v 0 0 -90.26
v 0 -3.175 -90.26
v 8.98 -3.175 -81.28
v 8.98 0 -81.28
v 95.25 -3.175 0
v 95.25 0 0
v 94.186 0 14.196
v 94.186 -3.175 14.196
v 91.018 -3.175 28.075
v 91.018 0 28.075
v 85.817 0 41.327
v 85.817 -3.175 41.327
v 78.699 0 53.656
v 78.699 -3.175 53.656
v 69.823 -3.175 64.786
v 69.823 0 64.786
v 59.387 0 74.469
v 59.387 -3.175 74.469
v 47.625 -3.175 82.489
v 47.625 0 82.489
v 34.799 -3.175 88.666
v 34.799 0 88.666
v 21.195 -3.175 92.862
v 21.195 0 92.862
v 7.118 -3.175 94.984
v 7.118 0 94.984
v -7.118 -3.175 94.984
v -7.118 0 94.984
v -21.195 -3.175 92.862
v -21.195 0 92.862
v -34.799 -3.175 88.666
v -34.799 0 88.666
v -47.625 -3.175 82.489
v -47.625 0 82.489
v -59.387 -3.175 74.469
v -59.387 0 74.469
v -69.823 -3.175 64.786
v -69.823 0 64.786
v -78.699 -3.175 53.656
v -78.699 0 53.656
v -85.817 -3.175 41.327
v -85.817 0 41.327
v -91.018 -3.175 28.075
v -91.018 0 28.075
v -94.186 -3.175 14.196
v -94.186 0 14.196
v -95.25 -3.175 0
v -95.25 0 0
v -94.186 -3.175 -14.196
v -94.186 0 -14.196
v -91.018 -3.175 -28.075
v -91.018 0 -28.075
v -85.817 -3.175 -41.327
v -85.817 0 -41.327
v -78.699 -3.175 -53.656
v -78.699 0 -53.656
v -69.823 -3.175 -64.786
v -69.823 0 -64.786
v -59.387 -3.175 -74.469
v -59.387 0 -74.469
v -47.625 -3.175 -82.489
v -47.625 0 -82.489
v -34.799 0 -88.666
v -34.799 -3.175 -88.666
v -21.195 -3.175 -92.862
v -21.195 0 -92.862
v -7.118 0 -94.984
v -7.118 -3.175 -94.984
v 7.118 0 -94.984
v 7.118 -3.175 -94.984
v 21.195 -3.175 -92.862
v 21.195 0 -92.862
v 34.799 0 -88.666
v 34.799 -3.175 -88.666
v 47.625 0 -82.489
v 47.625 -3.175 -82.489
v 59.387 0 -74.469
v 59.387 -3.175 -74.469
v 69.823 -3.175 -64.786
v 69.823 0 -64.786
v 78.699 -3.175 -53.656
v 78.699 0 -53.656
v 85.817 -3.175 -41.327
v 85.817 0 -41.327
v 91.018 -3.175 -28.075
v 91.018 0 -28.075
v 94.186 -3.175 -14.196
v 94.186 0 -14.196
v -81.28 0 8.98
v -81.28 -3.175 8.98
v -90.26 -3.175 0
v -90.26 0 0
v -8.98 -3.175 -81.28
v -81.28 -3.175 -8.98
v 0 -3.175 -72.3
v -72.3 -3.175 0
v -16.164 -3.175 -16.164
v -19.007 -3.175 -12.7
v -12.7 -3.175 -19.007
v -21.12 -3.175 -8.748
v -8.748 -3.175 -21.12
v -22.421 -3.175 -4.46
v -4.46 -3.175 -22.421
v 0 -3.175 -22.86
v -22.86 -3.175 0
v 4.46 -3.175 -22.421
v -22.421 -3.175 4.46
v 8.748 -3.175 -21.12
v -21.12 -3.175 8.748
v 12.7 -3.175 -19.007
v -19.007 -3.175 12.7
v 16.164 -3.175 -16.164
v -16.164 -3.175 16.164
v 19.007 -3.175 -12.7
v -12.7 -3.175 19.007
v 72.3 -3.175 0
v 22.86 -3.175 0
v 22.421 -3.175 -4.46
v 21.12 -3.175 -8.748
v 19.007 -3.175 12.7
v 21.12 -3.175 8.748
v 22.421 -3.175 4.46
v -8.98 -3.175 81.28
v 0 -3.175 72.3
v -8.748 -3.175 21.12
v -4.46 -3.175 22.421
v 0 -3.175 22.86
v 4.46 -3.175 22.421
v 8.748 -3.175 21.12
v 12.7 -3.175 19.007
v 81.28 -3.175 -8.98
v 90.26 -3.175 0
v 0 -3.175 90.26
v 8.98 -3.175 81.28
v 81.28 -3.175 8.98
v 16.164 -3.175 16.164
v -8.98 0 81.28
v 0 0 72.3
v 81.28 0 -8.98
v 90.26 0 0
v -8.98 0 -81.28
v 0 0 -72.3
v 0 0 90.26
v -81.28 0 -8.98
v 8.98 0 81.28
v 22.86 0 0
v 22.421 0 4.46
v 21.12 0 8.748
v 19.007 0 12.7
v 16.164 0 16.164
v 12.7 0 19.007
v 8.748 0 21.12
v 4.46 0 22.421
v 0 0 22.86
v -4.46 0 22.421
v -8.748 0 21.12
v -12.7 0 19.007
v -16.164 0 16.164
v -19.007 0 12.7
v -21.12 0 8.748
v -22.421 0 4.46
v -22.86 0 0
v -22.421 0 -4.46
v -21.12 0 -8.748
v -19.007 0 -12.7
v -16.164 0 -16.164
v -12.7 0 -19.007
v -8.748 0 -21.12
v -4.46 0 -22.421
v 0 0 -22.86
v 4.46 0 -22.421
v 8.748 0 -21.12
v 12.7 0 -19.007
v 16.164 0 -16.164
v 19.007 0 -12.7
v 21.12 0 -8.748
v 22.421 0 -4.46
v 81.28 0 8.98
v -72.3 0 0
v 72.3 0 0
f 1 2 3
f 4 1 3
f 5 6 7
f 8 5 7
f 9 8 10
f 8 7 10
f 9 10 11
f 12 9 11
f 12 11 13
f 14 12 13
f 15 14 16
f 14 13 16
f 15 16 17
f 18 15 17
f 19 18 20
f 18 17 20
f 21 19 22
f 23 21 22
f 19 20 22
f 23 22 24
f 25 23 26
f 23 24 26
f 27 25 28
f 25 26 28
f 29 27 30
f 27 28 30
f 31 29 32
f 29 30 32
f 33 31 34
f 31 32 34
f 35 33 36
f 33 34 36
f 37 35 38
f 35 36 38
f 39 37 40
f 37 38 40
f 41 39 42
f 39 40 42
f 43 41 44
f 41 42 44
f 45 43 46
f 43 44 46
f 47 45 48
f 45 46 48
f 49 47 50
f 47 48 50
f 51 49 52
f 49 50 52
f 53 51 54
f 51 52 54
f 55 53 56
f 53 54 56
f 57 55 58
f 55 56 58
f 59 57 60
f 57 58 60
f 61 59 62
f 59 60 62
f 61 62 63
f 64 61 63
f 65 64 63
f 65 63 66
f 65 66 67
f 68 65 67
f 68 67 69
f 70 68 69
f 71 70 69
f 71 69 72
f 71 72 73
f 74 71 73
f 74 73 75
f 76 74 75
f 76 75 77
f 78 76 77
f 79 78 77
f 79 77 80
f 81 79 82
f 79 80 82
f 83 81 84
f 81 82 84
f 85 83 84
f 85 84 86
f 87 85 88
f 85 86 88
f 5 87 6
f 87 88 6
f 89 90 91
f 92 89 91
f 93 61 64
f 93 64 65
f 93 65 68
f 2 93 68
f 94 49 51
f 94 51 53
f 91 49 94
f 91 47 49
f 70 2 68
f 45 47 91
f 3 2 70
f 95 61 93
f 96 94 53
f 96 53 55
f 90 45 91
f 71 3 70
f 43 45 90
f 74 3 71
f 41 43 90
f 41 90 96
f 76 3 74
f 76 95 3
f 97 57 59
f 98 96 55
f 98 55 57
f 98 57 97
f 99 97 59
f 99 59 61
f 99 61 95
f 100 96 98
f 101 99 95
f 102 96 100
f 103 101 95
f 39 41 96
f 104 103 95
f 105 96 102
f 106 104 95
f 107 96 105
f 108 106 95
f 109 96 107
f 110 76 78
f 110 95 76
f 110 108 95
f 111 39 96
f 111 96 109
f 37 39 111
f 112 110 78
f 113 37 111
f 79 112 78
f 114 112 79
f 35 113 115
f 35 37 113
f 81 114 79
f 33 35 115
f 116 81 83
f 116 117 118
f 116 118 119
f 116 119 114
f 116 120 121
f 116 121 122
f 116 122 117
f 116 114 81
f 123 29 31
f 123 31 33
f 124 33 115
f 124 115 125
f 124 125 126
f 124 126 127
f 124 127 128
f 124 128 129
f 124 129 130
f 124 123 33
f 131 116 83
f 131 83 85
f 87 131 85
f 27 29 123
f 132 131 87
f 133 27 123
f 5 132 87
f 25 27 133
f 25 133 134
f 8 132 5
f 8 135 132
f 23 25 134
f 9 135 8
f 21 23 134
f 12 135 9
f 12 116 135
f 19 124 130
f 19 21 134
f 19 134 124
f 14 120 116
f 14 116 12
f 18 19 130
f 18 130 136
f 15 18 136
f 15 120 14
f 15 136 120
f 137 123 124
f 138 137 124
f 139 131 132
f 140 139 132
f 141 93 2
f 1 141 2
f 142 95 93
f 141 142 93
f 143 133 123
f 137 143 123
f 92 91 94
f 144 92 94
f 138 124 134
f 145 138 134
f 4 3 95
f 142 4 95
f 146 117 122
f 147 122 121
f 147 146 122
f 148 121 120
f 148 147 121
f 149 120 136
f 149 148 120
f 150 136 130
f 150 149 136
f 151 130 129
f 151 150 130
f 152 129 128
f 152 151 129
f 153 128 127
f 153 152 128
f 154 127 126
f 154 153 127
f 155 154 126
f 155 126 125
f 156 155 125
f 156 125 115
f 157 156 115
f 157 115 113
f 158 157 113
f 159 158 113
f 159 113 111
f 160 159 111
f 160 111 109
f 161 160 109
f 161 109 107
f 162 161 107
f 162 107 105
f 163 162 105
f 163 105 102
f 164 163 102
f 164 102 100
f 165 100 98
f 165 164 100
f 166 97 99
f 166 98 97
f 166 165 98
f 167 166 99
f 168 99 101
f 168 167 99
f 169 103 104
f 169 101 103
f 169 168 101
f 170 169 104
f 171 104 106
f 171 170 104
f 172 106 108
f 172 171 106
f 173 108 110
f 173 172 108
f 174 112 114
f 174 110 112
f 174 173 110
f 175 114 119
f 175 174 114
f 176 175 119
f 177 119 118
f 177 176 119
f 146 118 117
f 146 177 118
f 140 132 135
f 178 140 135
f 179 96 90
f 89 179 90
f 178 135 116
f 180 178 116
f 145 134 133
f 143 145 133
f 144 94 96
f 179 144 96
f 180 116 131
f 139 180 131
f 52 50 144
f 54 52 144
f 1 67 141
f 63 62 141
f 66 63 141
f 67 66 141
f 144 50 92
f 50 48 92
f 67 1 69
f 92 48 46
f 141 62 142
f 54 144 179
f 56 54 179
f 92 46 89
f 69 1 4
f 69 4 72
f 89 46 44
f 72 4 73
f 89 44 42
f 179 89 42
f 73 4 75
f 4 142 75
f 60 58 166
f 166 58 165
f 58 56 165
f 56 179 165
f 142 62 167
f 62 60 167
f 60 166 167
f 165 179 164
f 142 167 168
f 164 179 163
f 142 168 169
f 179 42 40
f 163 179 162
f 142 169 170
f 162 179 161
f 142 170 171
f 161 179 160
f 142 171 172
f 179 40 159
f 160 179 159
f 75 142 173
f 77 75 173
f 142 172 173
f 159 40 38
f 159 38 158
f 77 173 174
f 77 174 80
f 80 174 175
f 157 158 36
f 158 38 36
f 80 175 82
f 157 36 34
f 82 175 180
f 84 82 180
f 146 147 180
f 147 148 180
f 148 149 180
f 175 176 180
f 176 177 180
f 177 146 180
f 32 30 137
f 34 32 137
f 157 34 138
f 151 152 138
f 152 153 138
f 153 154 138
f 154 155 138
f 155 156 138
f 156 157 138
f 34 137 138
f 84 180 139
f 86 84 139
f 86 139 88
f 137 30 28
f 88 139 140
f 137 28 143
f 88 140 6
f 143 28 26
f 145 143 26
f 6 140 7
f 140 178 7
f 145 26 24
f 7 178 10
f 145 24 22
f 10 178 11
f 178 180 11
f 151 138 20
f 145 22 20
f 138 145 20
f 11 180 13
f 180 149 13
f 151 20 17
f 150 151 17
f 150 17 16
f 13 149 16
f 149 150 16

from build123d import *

# Parameters (mm, degrees)
F0_R     = 95.25
F2_DEPTH = 3.175
F1_R     = 22.86
F3_DEPTH = 25.4
F5_DEPTH = 25.4


with BuildPart() as f2:
    # F0 (on Front) → F2 (new body)
    with BuildSketch(Plane.XZ):
        Circle(F0_R)
    extrude(amount=F2_DEPTH)

    # F1 (on face) → F3 (cut)
    with BuildSketch(Plane.XZ):
        Circle(F1_R)
    extrude(amount=F3_DEPTH, mode=Mode.SUBTRACT)

    # F4 (on face) → F5 (cut)
    with BuildSketch(Plane.XZ.offset(3.175)):
        Polygon((-81.28, -8.980256), (-72.299744, 0), (-81.28, 8.980256), (-90.260256, 0), align=None)
        Polygon((0, -90.260256), (8.980256, -81.28), (0, -72.299744), (-8.980256, -81.28), align=None)
        Polygon((90.260256, 0), (81.28, 8.980256), (72.299744, 0), (81.28, -8.980256), align=None)
        Polygon((0, 90.260256), (-8.980256, 81.28), (0, 72.299744), (8.980256, 81.28), align=None)
    extrude(amount=-F5_DEPTH, mode=Mode.SUBTRACT)


solid = f2.part
